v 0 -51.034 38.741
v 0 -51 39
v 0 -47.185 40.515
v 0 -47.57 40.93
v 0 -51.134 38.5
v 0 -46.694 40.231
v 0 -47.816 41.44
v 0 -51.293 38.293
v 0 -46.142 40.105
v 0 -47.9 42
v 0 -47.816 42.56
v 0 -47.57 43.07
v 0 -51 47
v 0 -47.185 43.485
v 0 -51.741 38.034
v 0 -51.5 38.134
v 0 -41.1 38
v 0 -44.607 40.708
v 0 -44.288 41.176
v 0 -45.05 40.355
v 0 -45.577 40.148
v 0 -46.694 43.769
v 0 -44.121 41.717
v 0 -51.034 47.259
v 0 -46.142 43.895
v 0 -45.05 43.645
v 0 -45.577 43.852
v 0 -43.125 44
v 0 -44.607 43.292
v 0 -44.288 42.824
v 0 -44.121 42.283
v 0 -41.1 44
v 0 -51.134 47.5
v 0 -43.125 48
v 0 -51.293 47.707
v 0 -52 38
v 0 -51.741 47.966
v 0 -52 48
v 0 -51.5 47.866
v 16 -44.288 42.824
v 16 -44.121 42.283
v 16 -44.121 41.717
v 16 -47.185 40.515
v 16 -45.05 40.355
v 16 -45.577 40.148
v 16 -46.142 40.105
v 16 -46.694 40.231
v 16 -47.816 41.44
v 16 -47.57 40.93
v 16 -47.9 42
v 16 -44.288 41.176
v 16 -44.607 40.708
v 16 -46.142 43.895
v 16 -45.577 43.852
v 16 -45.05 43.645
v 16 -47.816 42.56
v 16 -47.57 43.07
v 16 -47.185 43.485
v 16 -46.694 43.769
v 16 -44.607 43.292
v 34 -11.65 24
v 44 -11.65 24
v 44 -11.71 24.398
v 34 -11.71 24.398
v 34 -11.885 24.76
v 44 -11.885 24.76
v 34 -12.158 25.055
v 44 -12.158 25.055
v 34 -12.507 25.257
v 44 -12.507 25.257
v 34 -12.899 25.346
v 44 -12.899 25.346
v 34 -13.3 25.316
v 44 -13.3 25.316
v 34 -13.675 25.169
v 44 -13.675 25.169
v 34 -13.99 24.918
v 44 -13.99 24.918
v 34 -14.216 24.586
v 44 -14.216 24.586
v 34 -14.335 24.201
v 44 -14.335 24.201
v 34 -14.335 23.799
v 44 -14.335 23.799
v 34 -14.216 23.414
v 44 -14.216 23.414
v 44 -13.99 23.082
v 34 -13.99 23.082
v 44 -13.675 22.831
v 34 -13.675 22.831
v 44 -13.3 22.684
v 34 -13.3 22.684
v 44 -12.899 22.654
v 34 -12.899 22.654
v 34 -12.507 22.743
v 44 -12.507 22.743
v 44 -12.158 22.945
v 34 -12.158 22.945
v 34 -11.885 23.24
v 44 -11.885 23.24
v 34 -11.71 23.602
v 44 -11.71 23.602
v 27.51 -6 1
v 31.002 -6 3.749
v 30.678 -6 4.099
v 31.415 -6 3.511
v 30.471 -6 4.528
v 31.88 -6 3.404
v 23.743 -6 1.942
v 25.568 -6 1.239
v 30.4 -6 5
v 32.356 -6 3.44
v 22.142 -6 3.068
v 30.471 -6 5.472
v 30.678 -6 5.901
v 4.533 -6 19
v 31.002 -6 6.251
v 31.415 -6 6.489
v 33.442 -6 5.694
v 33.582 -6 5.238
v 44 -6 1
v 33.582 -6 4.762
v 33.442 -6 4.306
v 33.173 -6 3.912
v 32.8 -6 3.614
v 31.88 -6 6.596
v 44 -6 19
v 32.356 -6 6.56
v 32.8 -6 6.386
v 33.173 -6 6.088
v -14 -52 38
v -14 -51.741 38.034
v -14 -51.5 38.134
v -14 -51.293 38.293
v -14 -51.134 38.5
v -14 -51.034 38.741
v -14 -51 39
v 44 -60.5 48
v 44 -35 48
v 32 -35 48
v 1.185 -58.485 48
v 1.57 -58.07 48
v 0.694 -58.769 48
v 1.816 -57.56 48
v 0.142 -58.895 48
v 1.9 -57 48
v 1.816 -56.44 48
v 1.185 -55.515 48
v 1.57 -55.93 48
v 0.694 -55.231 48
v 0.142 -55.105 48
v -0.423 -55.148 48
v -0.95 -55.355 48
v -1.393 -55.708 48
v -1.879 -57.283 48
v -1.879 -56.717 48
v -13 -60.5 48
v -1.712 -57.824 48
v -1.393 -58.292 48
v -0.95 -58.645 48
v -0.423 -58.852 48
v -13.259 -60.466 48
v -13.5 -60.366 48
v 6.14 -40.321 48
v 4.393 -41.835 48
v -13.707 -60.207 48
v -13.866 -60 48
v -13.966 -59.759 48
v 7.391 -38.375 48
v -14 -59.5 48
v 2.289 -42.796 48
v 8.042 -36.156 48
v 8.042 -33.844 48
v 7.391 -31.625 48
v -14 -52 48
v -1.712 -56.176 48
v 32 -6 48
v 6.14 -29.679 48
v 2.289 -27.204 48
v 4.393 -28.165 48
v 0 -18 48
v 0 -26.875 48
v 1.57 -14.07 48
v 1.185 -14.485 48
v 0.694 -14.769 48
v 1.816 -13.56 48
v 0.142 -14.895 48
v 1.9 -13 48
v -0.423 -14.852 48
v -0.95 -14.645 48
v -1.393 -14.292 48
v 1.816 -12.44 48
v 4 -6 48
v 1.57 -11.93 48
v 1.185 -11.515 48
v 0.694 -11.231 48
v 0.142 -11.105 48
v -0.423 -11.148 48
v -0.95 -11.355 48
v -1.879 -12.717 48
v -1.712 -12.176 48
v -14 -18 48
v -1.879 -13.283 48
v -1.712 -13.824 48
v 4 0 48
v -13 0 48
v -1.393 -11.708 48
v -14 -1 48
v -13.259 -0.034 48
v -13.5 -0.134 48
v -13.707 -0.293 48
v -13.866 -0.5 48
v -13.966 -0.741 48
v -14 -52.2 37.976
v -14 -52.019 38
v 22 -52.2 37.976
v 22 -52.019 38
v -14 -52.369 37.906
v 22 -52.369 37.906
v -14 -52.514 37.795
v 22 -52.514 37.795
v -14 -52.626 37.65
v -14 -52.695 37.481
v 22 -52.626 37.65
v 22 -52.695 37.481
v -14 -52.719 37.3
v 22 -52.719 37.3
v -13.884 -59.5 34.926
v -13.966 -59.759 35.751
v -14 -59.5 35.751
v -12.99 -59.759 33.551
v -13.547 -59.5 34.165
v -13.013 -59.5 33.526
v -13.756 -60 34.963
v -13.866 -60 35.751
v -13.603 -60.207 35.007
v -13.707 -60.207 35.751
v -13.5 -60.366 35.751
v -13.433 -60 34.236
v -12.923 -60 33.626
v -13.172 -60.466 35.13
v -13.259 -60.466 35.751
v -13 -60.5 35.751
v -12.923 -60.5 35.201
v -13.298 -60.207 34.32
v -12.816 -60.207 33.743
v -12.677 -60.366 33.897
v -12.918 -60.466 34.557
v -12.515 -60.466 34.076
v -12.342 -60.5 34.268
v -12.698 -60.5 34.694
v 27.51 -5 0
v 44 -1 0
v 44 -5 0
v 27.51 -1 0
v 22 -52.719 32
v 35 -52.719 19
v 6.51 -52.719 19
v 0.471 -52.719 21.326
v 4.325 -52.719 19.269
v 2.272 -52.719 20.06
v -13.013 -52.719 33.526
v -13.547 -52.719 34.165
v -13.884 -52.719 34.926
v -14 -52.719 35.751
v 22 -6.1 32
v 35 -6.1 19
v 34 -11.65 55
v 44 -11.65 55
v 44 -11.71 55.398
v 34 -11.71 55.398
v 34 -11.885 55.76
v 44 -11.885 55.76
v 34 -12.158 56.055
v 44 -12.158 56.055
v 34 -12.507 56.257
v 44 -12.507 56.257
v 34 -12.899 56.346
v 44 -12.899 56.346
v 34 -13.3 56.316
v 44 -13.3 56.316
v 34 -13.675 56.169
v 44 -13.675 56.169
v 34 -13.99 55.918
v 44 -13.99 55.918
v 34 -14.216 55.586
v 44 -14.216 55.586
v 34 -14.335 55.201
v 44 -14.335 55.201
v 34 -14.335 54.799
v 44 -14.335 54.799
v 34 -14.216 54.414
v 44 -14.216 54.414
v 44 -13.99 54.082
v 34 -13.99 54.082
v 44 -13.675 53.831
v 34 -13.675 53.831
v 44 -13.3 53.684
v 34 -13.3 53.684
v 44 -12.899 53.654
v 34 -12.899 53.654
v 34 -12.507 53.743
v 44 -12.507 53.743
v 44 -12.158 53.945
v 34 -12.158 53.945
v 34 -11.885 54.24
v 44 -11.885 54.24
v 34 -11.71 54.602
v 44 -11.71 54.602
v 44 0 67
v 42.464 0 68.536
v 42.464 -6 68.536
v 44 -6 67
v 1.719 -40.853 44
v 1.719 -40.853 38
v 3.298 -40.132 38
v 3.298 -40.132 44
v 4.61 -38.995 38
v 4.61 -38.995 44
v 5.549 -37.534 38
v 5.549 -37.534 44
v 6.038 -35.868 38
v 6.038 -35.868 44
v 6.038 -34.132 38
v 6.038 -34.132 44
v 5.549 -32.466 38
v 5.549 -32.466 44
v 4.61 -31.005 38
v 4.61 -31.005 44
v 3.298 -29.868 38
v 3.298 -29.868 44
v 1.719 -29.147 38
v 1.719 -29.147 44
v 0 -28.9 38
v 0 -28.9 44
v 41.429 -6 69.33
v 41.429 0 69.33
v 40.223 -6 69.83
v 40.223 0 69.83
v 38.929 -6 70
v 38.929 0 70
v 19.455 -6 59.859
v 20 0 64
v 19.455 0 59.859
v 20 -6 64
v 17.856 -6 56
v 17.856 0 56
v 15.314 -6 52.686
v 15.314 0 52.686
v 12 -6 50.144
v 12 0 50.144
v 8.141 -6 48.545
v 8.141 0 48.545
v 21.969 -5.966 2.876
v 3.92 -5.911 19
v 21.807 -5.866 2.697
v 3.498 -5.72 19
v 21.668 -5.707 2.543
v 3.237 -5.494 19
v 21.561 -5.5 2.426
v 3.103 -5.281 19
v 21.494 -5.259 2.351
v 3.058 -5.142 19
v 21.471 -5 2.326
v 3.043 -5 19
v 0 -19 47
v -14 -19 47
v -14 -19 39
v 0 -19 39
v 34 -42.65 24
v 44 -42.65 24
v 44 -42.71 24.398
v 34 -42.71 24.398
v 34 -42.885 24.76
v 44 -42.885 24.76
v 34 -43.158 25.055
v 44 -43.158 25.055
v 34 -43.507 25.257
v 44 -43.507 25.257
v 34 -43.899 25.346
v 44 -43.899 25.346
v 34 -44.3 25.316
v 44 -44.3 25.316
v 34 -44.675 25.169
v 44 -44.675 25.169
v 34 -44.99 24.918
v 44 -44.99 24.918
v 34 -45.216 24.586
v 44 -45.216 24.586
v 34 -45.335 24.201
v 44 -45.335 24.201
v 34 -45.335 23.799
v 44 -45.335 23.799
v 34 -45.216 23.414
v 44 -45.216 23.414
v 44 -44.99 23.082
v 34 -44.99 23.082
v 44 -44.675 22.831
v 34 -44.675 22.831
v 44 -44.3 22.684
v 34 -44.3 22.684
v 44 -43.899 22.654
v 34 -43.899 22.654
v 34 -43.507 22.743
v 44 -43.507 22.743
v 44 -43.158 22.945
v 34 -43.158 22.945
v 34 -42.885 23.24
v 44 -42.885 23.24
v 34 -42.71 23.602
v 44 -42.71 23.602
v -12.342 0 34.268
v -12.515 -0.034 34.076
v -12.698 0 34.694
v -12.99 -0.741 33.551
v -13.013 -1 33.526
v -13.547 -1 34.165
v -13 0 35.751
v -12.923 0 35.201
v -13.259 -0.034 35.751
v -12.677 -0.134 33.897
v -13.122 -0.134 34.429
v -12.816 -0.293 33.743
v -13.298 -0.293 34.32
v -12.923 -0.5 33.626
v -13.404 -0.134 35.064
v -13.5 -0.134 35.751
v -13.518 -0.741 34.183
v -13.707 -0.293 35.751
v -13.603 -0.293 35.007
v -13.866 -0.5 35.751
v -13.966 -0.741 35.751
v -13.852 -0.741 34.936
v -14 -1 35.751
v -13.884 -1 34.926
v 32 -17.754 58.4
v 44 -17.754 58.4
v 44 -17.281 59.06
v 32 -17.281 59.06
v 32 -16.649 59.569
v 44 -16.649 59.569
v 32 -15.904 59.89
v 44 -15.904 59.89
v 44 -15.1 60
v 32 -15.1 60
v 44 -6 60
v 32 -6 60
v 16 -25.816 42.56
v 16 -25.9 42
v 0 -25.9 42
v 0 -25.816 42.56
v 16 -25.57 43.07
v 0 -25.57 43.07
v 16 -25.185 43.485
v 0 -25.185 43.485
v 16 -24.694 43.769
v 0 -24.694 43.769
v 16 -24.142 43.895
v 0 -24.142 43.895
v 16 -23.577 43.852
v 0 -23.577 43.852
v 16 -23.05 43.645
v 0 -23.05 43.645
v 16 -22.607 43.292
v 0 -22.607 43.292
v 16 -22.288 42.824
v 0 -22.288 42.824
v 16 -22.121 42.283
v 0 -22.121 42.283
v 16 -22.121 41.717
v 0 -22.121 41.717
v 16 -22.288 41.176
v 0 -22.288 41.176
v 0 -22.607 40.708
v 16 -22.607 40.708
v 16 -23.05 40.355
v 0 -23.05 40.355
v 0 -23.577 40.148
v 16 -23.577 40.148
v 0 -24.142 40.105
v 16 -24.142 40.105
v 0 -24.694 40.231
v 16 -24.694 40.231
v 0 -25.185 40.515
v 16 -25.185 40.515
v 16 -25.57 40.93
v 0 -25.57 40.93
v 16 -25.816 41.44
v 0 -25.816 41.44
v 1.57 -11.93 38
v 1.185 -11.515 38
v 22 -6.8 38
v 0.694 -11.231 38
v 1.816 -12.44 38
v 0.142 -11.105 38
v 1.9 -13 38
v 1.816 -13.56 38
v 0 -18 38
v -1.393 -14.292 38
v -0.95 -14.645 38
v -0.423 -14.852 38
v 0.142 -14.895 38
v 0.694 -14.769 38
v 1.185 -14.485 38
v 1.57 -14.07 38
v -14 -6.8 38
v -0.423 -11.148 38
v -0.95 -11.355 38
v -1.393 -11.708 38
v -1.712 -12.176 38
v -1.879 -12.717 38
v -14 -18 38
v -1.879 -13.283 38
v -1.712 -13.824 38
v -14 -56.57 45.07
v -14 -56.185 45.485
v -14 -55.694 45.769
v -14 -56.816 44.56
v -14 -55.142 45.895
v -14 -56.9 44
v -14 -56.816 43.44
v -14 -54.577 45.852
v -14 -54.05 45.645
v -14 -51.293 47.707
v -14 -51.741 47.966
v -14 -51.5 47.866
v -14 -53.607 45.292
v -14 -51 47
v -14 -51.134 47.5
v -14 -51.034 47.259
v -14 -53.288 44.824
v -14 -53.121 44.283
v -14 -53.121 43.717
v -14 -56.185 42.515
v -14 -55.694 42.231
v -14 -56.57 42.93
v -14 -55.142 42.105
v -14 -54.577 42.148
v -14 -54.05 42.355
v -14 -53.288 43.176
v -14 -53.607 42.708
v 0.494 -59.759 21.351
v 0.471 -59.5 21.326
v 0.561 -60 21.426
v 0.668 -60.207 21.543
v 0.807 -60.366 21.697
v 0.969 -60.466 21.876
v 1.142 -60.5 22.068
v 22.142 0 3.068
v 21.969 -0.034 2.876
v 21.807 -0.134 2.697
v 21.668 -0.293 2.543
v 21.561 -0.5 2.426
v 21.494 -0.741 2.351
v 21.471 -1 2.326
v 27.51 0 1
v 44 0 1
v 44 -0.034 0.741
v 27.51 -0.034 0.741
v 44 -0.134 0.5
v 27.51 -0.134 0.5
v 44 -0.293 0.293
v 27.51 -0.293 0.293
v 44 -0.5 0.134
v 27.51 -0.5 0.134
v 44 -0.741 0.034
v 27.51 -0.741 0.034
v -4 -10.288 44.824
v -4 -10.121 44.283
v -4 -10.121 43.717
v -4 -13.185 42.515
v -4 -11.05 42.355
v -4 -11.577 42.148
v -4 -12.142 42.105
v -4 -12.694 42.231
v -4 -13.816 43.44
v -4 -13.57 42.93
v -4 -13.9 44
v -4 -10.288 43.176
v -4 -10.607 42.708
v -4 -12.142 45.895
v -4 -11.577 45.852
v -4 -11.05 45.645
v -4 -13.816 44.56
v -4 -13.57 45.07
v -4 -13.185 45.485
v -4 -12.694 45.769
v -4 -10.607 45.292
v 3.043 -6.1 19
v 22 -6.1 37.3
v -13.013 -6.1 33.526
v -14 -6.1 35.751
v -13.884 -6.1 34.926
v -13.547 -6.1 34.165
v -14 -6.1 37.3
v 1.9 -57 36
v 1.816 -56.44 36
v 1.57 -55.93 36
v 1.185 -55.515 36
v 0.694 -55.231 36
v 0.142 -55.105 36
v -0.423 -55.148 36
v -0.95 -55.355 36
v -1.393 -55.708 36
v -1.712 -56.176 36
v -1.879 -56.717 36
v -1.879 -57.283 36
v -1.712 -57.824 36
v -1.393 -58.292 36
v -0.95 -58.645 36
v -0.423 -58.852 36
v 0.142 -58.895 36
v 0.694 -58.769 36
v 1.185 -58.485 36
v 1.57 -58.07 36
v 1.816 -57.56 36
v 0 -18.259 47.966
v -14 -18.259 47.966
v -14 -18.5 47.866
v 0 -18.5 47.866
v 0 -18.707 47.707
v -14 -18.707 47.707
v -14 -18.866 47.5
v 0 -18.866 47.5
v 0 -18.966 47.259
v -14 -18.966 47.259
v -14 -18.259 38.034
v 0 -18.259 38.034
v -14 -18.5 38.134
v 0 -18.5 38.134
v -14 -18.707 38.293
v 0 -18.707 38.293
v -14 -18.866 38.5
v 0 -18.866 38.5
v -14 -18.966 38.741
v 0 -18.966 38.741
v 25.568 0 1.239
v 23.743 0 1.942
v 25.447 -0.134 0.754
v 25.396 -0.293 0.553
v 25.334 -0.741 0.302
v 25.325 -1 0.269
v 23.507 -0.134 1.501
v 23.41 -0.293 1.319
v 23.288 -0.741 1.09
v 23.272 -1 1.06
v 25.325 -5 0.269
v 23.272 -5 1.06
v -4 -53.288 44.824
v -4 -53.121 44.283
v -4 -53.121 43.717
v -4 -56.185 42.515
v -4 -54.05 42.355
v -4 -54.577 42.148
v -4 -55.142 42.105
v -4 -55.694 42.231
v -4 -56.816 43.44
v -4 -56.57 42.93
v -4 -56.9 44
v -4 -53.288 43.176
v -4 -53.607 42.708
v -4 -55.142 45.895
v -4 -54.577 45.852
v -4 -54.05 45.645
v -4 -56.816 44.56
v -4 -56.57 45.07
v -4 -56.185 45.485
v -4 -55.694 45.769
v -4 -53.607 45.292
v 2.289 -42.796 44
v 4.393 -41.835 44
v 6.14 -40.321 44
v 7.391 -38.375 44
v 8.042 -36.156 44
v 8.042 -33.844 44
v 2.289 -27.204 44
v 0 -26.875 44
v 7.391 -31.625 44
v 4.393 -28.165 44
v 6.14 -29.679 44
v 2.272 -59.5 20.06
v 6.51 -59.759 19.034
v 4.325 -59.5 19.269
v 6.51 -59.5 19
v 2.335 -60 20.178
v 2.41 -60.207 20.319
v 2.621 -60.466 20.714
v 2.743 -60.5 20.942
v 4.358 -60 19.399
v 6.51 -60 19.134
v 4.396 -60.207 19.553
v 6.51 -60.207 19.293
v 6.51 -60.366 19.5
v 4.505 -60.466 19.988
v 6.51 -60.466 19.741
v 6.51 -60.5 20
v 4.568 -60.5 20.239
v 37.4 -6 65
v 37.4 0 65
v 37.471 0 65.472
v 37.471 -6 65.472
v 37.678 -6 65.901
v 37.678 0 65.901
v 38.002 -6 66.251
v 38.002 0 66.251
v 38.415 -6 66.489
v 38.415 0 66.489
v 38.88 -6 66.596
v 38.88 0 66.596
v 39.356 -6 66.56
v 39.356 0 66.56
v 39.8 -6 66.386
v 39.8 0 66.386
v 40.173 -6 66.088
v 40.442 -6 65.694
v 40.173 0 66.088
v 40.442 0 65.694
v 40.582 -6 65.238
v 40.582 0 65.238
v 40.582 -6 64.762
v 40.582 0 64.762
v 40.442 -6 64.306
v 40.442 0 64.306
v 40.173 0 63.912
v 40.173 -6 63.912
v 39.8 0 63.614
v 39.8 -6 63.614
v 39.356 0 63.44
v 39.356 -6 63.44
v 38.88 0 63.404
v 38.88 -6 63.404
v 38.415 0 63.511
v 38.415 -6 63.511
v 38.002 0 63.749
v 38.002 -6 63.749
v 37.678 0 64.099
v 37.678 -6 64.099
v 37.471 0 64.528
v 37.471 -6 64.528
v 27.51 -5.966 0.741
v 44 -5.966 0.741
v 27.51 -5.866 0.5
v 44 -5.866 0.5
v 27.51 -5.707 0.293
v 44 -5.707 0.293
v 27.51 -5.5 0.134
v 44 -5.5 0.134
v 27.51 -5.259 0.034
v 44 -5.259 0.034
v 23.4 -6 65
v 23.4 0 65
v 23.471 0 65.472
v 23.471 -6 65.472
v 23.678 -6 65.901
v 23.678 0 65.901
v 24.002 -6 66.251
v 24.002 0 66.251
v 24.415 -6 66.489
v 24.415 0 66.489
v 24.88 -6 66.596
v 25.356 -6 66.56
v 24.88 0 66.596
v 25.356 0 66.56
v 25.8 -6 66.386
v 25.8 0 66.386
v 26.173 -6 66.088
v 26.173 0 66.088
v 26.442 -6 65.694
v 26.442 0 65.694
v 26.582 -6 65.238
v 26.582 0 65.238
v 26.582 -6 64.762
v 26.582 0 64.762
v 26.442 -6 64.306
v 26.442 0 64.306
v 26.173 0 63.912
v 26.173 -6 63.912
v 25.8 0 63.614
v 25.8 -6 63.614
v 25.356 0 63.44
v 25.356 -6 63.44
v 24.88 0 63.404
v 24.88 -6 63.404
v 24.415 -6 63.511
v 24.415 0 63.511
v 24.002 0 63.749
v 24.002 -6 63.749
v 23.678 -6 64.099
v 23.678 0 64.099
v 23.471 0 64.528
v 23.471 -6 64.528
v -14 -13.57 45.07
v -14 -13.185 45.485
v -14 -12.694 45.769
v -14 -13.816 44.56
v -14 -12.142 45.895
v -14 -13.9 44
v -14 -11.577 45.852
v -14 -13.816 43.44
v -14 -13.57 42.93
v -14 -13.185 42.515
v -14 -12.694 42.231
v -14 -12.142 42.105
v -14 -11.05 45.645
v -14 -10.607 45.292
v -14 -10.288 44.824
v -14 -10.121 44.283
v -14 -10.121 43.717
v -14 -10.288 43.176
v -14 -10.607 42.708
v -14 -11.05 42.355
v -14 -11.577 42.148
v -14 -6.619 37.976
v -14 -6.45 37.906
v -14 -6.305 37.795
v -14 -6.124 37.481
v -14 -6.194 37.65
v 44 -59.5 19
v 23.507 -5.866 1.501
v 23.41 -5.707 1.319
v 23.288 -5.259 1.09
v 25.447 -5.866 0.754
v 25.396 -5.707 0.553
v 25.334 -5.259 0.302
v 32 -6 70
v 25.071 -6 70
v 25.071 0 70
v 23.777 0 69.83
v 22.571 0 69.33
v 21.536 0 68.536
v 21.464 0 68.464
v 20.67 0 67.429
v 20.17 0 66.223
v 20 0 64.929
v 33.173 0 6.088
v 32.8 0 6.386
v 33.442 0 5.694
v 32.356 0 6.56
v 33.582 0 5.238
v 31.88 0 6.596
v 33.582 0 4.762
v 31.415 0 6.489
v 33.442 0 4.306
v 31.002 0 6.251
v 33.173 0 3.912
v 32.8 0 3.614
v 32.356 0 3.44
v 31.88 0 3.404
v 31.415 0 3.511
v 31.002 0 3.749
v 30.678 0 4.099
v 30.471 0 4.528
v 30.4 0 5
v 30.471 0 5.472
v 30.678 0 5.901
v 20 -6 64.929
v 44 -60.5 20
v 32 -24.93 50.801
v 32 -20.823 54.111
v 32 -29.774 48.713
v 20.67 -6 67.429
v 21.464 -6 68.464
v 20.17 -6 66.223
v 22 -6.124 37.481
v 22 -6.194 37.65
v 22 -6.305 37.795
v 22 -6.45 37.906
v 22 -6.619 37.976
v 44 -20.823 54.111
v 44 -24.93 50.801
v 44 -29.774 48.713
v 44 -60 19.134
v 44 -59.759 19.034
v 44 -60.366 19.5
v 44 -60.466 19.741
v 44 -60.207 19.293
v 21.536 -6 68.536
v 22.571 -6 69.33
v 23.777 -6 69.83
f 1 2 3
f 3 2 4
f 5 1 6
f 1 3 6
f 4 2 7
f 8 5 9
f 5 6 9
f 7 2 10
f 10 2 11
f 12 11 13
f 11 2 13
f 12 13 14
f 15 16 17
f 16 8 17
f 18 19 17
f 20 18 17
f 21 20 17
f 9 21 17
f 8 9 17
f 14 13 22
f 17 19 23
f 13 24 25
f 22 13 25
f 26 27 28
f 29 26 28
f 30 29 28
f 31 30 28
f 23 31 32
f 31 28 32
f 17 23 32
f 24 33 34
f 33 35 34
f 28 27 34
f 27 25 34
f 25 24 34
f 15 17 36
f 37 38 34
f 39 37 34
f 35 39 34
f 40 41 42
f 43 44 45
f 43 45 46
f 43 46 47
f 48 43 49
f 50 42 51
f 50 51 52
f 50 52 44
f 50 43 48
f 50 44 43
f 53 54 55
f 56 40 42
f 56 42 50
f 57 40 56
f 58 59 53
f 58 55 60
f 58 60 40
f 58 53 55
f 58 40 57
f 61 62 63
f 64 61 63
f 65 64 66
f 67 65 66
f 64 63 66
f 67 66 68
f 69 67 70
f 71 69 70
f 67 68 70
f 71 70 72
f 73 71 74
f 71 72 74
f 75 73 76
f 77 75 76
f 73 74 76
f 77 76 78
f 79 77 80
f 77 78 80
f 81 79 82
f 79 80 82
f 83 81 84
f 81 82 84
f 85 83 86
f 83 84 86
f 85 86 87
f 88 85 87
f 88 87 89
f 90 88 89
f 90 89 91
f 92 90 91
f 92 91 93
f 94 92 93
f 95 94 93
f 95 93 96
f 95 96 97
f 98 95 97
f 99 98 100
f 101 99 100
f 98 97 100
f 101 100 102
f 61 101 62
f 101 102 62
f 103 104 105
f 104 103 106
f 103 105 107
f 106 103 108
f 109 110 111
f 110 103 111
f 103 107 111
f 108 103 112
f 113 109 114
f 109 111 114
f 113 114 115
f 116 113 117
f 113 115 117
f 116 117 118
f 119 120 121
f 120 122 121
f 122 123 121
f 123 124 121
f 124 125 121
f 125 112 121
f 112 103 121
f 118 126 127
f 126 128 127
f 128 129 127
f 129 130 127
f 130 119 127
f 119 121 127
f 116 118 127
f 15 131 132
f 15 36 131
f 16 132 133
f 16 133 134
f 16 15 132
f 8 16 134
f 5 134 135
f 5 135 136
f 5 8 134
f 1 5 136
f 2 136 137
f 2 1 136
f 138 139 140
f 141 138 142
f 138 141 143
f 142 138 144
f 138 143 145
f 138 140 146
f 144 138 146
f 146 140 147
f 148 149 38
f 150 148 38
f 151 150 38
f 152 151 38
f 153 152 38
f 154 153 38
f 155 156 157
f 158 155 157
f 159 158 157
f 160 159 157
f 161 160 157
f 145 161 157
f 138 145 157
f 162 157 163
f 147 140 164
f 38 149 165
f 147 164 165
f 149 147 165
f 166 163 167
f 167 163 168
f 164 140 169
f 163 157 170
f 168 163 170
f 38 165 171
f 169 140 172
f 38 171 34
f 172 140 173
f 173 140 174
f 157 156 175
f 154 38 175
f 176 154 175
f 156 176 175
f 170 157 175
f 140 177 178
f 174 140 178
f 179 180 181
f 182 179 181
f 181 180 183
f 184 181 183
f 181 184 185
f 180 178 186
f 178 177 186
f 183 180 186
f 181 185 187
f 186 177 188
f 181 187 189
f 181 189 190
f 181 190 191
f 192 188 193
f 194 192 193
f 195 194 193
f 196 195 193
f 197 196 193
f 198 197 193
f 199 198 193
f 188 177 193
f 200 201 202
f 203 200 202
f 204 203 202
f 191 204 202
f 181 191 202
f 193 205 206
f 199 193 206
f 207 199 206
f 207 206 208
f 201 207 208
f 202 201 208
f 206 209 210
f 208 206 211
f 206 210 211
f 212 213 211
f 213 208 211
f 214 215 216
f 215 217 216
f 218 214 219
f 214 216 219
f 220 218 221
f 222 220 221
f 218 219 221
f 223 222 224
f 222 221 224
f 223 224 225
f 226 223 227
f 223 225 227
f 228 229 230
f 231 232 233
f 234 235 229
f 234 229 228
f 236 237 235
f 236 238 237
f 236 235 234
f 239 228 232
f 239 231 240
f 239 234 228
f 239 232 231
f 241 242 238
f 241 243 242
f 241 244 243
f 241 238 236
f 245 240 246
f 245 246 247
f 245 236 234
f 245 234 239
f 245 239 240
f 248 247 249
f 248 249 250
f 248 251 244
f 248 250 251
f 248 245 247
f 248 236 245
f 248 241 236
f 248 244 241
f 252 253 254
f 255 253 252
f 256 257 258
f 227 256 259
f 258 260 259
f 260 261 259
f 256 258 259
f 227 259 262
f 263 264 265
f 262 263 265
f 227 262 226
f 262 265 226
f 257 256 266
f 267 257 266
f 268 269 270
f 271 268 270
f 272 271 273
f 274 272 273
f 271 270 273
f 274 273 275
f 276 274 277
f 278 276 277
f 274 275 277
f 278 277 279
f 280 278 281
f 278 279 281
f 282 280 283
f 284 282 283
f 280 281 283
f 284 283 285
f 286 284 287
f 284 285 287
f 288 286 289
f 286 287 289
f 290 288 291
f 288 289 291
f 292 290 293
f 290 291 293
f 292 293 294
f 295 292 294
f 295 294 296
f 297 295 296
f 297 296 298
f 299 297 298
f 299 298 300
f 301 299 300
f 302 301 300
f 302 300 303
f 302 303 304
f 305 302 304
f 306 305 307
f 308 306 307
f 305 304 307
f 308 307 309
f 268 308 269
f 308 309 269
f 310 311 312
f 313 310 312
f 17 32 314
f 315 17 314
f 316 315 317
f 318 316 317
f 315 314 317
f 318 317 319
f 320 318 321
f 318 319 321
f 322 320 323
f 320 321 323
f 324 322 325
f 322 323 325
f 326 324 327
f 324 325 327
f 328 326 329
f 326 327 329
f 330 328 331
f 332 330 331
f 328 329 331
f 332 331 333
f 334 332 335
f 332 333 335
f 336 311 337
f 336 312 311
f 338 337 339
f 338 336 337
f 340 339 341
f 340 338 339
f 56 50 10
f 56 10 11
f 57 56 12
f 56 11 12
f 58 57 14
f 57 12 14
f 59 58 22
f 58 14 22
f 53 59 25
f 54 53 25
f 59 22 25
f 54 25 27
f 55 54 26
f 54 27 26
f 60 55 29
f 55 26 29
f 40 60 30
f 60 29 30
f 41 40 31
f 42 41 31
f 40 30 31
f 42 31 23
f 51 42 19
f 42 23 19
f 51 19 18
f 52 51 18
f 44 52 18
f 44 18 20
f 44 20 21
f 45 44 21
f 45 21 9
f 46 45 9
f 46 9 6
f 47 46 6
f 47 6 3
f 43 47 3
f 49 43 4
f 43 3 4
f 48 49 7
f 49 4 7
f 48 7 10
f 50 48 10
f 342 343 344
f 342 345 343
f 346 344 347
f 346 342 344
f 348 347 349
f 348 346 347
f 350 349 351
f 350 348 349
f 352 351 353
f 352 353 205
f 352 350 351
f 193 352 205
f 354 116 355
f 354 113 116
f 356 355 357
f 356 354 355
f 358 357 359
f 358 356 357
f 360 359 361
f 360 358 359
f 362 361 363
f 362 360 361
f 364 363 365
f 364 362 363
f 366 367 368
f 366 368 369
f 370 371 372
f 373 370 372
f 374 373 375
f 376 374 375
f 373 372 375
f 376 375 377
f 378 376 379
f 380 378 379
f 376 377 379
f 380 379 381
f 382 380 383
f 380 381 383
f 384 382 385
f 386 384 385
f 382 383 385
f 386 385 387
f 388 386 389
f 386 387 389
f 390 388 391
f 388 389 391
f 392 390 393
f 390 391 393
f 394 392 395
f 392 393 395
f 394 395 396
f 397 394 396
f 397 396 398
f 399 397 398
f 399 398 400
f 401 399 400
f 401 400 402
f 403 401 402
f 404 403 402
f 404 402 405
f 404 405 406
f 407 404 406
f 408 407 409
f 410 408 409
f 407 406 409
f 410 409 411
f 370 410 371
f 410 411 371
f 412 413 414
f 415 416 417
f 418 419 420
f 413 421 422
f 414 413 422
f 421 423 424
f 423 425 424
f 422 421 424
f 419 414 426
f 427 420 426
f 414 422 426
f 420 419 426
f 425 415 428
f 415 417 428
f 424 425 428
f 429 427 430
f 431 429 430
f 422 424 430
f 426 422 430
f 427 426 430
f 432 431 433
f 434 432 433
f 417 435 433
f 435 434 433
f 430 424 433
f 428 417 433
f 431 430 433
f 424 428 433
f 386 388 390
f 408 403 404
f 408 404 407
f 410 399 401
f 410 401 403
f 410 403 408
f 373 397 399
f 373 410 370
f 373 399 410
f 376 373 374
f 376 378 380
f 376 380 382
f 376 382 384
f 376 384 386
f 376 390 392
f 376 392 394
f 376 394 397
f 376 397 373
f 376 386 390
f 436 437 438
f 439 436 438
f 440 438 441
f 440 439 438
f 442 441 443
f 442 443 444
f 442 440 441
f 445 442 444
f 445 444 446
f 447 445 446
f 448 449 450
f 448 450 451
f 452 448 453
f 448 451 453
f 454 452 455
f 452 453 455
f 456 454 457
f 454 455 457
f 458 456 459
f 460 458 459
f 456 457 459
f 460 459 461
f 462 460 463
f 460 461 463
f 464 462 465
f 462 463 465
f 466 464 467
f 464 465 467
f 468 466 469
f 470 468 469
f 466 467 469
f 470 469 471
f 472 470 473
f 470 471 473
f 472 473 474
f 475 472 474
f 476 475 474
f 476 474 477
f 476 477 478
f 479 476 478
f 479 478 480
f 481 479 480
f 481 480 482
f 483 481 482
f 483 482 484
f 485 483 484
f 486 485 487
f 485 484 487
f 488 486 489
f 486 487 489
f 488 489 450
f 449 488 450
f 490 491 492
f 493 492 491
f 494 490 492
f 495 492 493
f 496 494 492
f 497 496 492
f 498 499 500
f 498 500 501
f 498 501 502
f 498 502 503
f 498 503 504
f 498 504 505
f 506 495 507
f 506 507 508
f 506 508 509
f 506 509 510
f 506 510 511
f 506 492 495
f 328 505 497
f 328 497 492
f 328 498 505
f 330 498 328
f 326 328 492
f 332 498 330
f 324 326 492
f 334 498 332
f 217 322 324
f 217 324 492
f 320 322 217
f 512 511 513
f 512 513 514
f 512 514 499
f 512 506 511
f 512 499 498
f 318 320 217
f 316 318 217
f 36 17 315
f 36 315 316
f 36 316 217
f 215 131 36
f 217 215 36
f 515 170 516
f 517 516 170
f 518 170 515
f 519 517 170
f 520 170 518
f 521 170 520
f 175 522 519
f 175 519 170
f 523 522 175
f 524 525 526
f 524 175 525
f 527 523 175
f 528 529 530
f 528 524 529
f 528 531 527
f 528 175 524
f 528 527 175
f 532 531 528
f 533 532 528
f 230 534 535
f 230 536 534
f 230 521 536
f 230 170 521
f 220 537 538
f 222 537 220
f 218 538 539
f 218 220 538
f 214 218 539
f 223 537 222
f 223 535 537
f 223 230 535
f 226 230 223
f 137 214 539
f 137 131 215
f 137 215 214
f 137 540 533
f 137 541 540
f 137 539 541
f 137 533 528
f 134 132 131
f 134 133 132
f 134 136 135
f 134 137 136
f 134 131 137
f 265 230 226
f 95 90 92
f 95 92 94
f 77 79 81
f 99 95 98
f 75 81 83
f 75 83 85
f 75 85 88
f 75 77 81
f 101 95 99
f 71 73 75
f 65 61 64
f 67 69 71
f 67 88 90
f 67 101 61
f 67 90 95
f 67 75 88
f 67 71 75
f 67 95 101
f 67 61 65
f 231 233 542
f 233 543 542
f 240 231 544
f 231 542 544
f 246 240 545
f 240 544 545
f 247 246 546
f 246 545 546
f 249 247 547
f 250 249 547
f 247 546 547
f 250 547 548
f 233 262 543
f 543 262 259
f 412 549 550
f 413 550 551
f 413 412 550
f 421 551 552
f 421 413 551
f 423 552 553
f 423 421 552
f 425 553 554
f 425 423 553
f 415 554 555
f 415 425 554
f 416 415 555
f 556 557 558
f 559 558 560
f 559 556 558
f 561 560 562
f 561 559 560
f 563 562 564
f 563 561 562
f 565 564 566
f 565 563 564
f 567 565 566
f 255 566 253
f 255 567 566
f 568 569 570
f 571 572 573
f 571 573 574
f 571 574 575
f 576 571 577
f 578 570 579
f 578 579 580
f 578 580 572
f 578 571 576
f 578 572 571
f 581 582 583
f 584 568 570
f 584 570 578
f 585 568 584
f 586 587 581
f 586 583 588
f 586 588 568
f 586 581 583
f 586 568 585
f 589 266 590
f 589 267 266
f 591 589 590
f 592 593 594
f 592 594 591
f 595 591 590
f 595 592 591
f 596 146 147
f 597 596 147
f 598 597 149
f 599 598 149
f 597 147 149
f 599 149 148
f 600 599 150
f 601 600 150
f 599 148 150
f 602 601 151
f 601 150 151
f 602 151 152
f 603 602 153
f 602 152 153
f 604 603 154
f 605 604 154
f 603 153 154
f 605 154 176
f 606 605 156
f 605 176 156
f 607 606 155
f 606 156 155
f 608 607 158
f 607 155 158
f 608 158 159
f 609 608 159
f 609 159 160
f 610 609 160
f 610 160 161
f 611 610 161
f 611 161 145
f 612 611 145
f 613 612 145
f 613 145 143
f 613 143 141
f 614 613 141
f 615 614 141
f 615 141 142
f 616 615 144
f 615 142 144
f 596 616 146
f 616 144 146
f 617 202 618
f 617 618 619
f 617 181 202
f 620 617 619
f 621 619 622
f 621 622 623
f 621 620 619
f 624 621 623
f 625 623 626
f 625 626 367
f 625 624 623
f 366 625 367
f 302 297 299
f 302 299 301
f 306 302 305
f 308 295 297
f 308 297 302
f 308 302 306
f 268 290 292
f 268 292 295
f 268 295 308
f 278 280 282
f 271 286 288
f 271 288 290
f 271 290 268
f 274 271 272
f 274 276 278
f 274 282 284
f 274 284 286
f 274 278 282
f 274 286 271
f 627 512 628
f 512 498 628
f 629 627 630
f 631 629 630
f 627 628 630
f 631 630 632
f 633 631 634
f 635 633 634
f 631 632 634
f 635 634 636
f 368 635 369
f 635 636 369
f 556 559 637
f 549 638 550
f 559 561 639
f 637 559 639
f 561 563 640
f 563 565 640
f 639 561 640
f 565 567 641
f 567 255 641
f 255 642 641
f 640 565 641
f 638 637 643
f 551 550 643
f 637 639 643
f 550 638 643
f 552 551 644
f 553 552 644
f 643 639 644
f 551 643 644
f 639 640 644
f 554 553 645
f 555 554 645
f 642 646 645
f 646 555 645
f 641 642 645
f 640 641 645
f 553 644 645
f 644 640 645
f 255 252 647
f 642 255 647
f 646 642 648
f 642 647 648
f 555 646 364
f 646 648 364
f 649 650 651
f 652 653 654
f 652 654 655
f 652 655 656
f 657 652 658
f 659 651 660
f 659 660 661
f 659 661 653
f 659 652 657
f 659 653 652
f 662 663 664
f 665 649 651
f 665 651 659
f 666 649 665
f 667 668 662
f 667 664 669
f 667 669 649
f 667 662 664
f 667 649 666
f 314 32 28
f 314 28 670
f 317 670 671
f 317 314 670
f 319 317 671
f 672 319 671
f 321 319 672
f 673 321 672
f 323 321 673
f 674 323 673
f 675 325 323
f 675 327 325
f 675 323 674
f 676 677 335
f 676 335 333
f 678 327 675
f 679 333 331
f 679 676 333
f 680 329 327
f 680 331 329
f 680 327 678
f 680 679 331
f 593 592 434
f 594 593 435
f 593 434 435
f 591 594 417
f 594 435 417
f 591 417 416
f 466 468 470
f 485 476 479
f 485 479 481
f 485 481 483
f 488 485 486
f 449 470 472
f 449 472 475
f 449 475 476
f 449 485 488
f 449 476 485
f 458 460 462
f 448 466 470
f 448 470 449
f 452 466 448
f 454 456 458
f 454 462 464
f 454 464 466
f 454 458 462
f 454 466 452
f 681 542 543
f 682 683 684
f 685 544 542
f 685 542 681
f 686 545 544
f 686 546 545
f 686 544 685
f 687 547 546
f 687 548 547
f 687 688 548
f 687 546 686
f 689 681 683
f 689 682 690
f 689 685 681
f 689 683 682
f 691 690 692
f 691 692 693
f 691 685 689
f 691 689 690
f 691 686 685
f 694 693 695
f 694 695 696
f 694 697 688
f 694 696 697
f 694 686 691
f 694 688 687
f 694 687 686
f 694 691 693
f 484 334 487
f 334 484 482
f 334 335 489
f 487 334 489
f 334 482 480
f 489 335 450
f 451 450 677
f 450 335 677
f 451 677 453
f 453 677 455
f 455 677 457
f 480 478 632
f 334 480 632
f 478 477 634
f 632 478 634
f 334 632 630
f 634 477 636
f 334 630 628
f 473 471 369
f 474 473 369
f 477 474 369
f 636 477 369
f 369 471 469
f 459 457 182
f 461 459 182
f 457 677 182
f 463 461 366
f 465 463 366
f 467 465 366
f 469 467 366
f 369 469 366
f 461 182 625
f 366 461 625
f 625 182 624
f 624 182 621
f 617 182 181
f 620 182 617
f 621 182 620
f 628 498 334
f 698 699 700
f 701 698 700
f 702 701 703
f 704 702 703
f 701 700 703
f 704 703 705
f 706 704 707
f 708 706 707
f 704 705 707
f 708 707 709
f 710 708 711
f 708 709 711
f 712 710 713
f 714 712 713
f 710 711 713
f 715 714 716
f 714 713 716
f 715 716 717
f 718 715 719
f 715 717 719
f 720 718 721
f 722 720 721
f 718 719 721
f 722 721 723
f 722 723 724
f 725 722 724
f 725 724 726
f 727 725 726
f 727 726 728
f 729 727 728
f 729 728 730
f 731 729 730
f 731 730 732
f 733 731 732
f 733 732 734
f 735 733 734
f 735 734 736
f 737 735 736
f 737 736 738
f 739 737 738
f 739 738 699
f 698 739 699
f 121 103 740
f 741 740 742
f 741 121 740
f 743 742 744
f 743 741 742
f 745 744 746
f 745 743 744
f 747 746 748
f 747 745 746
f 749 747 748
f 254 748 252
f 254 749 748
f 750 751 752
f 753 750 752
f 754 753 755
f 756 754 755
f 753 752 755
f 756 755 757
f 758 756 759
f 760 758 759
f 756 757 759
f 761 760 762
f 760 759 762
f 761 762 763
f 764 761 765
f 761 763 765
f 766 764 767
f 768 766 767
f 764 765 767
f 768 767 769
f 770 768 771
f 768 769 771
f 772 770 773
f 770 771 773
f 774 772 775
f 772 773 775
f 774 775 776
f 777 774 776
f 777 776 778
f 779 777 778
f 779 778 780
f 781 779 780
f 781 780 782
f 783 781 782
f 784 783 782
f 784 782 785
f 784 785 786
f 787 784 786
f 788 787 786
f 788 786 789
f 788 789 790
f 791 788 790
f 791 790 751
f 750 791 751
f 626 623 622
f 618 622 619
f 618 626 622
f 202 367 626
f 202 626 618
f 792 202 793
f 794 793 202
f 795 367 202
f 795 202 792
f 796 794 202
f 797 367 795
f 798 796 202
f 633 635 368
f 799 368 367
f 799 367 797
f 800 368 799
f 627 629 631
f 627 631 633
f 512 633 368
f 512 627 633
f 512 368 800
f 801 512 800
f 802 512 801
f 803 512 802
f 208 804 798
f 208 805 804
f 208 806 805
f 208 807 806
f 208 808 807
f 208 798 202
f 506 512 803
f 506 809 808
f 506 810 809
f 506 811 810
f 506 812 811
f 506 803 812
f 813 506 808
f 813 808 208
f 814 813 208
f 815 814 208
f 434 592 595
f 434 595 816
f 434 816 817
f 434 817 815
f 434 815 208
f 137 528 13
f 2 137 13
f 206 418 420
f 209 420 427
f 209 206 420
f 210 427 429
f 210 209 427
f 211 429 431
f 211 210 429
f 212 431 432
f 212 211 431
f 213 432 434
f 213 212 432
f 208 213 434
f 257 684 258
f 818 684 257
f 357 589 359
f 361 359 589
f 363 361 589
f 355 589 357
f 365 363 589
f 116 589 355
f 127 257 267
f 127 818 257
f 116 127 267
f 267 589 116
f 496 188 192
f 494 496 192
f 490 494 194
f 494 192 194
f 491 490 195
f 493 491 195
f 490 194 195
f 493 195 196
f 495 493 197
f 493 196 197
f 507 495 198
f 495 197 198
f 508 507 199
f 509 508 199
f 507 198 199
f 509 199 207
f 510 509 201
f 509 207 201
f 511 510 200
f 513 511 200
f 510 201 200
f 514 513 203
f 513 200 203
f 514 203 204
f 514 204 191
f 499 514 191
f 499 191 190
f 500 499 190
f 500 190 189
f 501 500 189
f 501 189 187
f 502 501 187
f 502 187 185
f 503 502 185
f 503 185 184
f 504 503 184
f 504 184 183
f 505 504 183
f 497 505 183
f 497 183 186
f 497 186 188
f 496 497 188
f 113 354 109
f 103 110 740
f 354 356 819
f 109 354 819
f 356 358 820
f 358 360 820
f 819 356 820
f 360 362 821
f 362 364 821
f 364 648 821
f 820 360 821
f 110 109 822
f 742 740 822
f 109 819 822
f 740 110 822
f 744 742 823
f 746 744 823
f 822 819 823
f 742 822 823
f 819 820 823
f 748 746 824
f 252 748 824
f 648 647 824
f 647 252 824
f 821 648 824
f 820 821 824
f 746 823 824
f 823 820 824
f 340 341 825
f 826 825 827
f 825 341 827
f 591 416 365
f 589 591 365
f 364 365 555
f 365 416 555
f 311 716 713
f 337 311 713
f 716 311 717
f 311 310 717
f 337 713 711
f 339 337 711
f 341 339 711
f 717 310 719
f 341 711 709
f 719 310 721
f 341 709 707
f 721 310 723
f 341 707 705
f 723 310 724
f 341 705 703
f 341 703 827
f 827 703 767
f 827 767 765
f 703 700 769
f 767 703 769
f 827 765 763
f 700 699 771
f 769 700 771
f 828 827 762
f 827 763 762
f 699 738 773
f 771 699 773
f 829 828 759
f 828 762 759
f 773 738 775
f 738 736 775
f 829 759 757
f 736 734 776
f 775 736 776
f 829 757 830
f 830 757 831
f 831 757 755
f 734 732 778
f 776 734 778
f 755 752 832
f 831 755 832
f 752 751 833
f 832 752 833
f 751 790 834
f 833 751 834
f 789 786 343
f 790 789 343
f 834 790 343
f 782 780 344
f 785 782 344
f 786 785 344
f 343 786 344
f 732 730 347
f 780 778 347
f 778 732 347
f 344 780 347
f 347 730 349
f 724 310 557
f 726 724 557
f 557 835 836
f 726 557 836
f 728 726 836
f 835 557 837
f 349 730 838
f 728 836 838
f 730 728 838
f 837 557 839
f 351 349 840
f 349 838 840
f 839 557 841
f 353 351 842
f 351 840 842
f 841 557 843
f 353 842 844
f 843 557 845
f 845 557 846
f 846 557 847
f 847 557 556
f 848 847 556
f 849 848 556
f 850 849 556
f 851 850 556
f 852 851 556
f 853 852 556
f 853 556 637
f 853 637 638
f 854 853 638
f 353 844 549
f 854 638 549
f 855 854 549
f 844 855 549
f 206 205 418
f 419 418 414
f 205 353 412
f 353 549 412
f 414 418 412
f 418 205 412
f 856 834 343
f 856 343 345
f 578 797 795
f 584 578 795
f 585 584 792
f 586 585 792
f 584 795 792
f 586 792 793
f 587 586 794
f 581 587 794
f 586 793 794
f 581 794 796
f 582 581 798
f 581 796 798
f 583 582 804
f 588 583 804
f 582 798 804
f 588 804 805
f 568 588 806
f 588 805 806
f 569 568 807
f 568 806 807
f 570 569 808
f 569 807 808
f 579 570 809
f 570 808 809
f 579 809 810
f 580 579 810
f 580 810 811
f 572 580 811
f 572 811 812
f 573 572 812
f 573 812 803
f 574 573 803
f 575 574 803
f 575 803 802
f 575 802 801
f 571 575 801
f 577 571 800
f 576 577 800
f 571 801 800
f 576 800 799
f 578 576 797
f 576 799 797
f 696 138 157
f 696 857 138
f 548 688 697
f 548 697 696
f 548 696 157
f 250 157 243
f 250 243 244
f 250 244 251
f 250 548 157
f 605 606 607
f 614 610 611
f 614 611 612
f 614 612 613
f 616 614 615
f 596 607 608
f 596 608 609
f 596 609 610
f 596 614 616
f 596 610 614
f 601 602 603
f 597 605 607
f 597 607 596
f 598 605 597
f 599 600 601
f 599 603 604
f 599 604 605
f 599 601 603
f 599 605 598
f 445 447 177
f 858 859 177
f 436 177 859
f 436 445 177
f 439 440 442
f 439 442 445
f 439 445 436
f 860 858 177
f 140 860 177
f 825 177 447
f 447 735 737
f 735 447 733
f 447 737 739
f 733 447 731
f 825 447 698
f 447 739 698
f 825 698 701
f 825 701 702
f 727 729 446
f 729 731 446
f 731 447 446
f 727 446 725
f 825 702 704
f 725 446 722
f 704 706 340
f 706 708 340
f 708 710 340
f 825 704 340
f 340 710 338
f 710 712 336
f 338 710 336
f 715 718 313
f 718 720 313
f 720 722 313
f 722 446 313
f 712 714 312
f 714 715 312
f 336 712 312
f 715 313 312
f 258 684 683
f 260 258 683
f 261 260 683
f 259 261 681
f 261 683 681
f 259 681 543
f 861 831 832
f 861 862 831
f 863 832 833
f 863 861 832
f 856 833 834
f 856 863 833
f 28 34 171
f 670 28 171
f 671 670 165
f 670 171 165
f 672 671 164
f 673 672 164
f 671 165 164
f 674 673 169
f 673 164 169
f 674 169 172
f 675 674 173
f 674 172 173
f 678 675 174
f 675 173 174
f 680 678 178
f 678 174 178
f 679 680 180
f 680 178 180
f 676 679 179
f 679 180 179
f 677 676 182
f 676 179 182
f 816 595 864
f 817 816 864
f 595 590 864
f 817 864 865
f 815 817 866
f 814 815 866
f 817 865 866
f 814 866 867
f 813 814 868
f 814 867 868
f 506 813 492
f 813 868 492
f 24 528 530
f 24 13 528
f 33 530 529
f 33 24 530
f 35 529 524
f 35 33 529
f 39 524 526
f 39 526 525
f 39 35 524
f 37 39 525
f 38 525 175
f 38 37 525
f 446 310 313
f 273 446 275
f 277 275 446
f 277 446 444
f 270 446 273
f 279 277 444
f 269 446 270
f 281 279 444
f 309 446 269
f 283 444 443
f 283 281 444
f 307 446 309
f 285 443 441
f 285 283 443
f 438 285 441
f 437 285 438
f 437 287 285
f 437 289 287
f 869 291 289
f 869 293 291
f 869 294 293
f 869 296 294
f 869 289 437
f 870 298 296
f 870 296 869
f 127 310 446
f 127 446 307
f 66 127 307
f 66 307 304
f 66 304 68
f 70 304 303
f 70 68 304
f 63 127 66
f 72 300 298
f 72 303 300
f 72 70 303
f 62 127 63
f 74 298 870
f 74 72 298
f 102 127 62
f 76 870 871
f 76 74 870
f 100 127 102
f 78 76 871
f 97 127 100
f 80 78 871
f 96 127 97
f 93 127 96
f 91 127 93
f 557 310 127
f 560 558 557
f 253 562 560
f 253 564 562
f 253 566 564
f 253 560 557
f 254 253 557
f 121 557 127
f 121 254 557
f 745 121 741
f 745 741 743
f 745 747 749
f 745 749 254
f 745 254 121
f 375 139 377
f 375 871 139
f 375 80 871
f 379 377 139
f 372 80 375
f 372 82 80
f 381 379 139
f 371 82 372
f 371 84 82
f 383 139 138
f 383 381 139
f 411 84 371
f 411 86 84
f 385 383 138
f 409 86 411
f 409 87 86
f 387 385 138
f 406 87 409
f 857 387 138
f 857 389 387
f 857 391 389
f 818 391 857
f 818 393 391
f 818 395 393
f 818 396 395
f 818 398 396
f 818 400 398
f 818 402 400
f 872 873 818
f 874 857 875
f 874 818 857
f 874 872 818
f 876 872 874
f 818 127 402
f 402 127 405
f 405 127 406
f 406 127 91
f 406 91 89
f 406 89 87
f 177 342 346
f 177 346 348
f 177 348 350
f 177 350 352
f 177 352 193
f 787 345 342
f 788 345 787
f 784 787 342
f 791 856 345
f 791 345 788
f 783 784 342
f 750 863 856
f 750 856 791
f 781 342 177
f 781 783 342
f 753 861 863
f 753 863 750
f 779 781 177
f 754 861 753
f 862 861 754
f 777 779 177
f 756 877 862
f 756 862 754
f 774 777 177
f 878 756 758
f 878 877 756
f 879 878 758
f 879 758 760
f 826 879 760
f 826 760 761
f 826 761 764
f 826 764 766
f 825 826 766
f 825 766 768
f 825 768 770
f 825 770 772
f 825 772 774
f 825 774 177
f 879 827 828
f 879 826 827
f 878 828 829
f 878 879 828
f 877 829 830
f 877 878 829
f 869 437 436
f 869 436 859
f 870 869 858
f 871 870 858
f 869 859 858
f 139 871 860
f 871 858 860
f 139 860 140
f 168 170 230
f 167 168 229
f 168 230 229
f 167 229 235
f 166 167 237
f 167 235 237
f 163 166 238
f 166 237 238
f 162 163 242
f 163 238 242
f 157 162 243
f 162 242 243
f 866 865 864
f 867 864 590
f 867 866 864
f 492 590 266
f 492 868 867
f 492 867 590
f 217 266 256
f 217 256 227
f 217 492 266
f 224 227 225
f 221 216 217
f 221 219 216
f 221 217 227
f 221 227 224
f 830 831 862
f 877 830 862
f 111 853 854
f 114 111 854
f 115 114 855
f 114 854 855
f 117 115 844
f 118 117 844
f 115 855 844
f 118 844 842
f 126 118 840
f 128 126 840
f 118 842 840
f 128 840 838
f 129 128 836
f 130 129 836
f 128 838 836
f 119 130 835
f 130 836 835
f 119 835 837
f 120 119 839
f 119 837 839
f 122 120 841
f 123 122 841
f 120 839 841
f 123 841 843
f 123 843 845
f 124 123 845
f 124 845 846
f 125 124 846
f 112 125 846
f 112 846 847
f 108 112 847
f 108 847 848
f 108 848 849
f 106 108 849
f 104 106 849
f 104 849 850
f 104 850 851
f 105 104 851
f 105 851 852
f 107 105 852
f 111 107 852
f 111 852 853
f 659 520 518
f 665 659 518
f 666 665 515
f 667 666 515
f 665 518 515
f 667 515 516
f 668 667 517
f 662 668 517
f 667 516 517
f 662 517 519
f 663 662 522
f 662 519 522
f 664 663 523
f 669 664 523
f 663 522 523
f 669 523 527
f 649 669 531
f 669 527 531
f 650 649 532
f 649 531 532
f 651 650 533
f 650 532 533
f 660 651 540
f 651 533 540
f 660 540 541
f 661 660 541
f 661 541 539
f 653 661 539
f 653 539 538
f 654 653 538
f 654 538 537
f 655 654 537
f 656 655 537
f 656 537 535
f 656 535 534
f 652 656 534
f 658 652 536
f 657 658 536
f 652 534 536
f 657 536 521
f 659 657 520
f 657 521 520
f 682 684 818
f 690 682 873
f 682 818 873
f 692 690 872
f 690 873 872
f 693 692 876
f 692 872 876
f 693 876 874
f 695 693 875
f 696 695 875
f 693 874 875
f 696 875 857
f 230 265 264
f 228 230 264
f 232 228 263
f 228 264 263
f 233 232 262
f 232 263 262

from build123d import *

# Parameters (mm, degrees)
PAD_DEPTH       = 70
POCKET_DEPTH    = 22
SKETCH008_W     = 61.659011
SKETCH008_H     = 41.462551
SKETCH008_W_2   = 60.331963
SKETCH008_H_2   = 13.684097
POCKET001_DEPTH = 76
SKETCH003_R     = 1.9
POCKET002_DEPTH = 12
POCKET003_DEPTH = 4
POCKET004_DEPTH = 6
SKETCH009_R     = 1.35
POCKET005_DEPTH = 10
SKETCH030_W     = 28.769002
SKETCH030_H     = 32
POCKET006_DEPTH = 48.001
SKETCH031_W     = 46.619307
SKETCH031_H     = 35.048725
POCKET007_DEPTH = 36
SKETCH032_R     = 1.9
POCKET008_DEPTH = 10
SKETCH013_R     = 1.9
POCKET009_DEPTH = 16
SKETCH010_R     = 1.6
POCKET010_DEPTH = 7
POCKET011_DEPTH = 60.501
POCKET012_DEPTH = 12.001
FILLET_R        = 3
CHAMFER_SIZE    = 3
FILLET001_R     = 5
FILLET002_R     = 9
FILLET003_R     = 0.7
FILLET004_R     = 1
FILLET005_R     = 1
FILLET006_R     = 3
FILLET007_R     = 1
FILLET008_R     = 1
CHAMFER001_SIZE = 13
FILLET009_R     = 1
FILLET010_R     = 16


with BuildPart() as part:
    # Sketch → Pad (new body)
    with BuildSketch(Plane.XY):
        Polygon((0, 0), (44, 0), (44, -60.5), (-14, -60.5), (-14, 0), align=None)
    extrude(amount=PAD_DEPTH)

    # Sketch002 (on Face7 of Pad) → Pocket (cut)
    with BuildSketch(Plane.XY.offset(70)):
        Polygon((32, -6), (32, -65.096024), (-40.783405, -65.096024), (-40.783405, 12.994774), (20, 12.994774), (20, -6), align=None)
    extrude(amount=-POCKET_DEPTH, mode=Mode.SUBTRACT)

    # Sketch008 (on Face3 of Pocket) → Pocket001 (cut)
    with BuildSketch(Plane.YZ.offset(44)):
        with Locations((-36.829505, -1.731275)):
            Rectangle(SKETCH008_W, SKETCH008_H)
        with Locations((-36.165982, 66.842049)):
            Rectangle(SKETCH008_W_2, SKETCH008_H_2)
    extrude(amount=-POCKET001_DEPTH, mode=Mode.SUBTRACT)

    # Sketch003 (on Face6 of Pocket001) → Pocket002 (cut)
    with BuildSketch(Plane.XY.offset(48)):
        with Locations((0, -13)):
            Circle(SKETCH003_R)
        with Locations((0, -57)):
            Circle(SKETCH003_R)
    extrude(amount=-POCKET002_DEPTH, mode=Mode.SUBTRACT)

    # Sketch004 (on Face6 of Pocket002) → Pocket003 (cut)
    with BuildSketch(Plane.XY.offset(48)):
        with BuildLine():
            ThreePointArc((0, -43.125), (8.125, -35), (0, -26.875))
            Line((-25, -26.875), (0, -26.875))
            Line((-25, -43.125), (-25, -26.875))
            Line((0, -43.125), (-25, -43.125))
        make_face()
    extrude(amount=-POCKET003_DEPTH, mode=Mode.SUBTRACT)

    # Sketch018 (on Face22 of Pocket003) → Pocket004 (cut)
    with BuildSketch(Plane.XY.offset(44)):
        with BuildLine():
            ThreePointArc((0, -41.1), (6.1, -35), (0, -28.9))
            Line((0, -28.9), (-50, -28.9))
            Line((-50, -41.1), (-50, -28.9))
            Line((0, -41.1), (-50, -41.1))
        make_face()
    extrude(amount=-POCKET004_DEPTH, mode=Mode.SUBTRACT)

    # Sketch009 (on Face3 of Pocket004) → Pocket005 (cut)
    with BuildSketch(Plane.YZ.offset(44)):
        with Locations((-44, 55)):
            Circle(SKETCH009_R)
        with Locations((-13, 24)):
            Circle(SKETCH009_R)
        with Locations((-13, 55)):
            Circle(SKETCH009_R)
        with Locations((-44, 24)):
            Circle(SKETCH009_R)
    extrude(amount=-POCKET005_DEPTH, mode=Mode.SUBTRACT)

    # Sketch030 (on Face6 of Pocket005) → Pocket006 (cut, through all)
    with BuildSketch(Plane.XY.offset(48)):
        with Locations((-14.384501, -35)):
            Rectangle(SKETCH030_W, SKETCH030_H)
    extrude(amount=-POCKET006_DEPTH, mode=Mode.SUBTRACT)

    # Sketch031 (on Face8 of Pocket006) → Pocket007 (cut)
    with BuildSketch(Plane(origin=(-14, 0, 0), x_dir=(0, -1, 0), z_dir=(-1, 0, 0))):
        with Locations((29.409654, 20.475638)):
            Rectangle(SKETCH031_W, SKETCH031_H)
    extrude(amount=-POCKET007_DEPTH, mode=Mode.SUBTRACT)

    # Sketch032 (on Face8 of Pocket007) → Pocket008 (cut)
    with BuildSketch(Plane(origin=(-14, 0, 0), x_dir=(0, -1, 0), z_dir=(-1, 0, 0))):
        with Locations((12, 44)):
            Circle(SKETCH032_R)
        with Locations((55, 44)):
            Circle(SKETCH032_R)
    extrude(amount=-POCKET008_DEPTH, mode=Mode.SUBTRACT)

    # Sketch013 (on Face21 of Pocket008) → Pocket009 (cut)
    with BuildSketch(Plane(origin=(0, 0, 0), x_dir=(0, -1, 0), z_dir=(-1, 0, 0))):
        with Locations((24, 42)):
            Circle(SKETCH013_R)
        with Locations((46, 42)):
            Circle(SKETCH013_R)
    extrude(amount=-POCKET009_DEPTH, mode=Mode.SUBTRACT)

    # Sketch010 (on Face1 of Pocket009) → Pocket010 (cut)
    with BuildSketch(Plane(origin=(0, 0, 0), x_dir=(-1, 0, 0), z_dir=(0, 1, 0))):
        with Locations((-32, 5)):
            Circle(SKETCH010_R)
        with Locations((-39, 65)):
            Circle(SKETCH010_R)
        with Locations((-25, 65)):
            Circle(SKETCH010_R)
    extrude(amount=-POCKET010_DEPTH, mode=Mode.SUBTRACT)

    # Sketch033 (on Face1 of Pocket010) → Pocket011 (cut, through all)
    with BuildSketch(Plane(origin=(0, 0, 0), x_dir=(-1, 0, 0), z_dir=(0, 1, 0))):
        Polygon((21.995766, 41.653675), (-34.908054, -9.830728), (21.995766, -12.411399), align=None)
    extrude(amount=-POCKET011_DEPTH, mode=Mode.SUBTRACT)

    # Sketch034 (on Face30 of Pocket011) → Pocket012 (cut, through all)
    with BuildSketch(Plane(origin=(32, 0, 0), x_dir=(0, -1, 0), z_dir=(-1, 0, 0))):
        with BuildLine():
            ThreePointArc((15.5, 67.5), (21.211418, 53.711418), (35, 48))
            Line((35, 48), (74.47, 48))
            Line((74.47, 67.5), (74.47, 48))
            Line((15.5, 67.5), (74.47, 67.5))
        make_face()
    extrude(amount=-POCKET012_DEPTH, mode=Mode.SUBTRACT)

    # Fillet
    fillet_edges = [part.edges().sort_by_distance(p)[0] for p in [
        (38, -17, 60),
    ]]
    fillet(fillet_edges, radius=FILLET_R)

    # Chamfer
    chamfer_edges = [part.edges().sort_by_distance(p)[0] for p in [
        (44, -3, 70),
        (20, -3, 70),
    ]]
    chamfer(chamfer_edges, length=CHAMFER_SIZE)

    # Fillet001
    fillet001_edges = [part.edges().sort_by_distance(p)[0] for p in [
        (41, -3, 70),
        (23, -3, 70),
        (20, -3, 67),
    ]]
    fillet(fillet001_edges, radius=FILLET001_R)

    # Fillet002
    fillet002_edges = [part.edges().sort_by_distance(p)[0] for p in [
        (24.042511, -3, 0),
        (3.042509, -56.609654, 19),
    ]]
    fillet(fillet002_edges, radius=FILLET002_R)

    # Fillet003
    fillet003_edges = [part.edges().sort_by_distance(p)[0] for p in [
        (4, -6.1, 38),
        (4, -52.719307, 38),
    ]]
    fillet(fillet003_edges, radius=FILLET003_R)

    # Fillet004
    fillet004_edges = [part.edges().sort_by_distance(p)[0] for p in [
        (-7, -19, 38),
        (-7, -51, 38),
    ]]
    fillet(fillet004_edges, radius=FILLET004_R)

    # Fillet005
    fillet005_edges = [part.edges().sort_by_distance(p)[0] for p in [
        (-7, -51, 48),
        (-7, -19, 48),
    ]]
    fillet(fillet005_edges, radius=FILLET005_R)

    # Fillet006
    fillet006_edges = [part.edges().sort_by_distance(p)[0] for p in [
        (-14, -56.609654, 34.419411),
        (-14, -3.05, 34.419411),
    ]]
    fillet(fillet006_edges, radius=FILLET006_R)

    # Fillet007
    fillet007_edges = [part.edges().sort_by_distance(p)[0] for p in [
        (35.754846, 0, 0),
    ]]
    fillet(fillet007_edges, radius=FILLET007_R)

    # Fillet008
    fillet008_edges = [part.edges().sort_by_distance(p)[0] for p in [
        (25.254845, -60.5, 19),
    ]]
    fillet(fillet008_edges, radius=FILLET008_R)

    # Chamfer001
    chamfer001_edges = [part.edges().sort_by_distance(p)[0] for p in [
        (22, -29.409654, 19),
    ]]
    chamfer(chamfer001_edges, length=CHAMFER001_SIZE)

    # Fillet009
    fillet009_edges = [part.edges().sort_by_distance(p)[0] for p in [
        (35.754846, -6, 0),
    ]]
    fillet(fillet009_edges, radius=FILLET009_R)

    # Fillet010
    fillet010_edges = [part.edges().sort_by_distance(p)[0] for p in [
        (20, -3, 48),
    ]]
    fillet(fillet010_edges, radius=FILLET010_R)


solid = part.part
